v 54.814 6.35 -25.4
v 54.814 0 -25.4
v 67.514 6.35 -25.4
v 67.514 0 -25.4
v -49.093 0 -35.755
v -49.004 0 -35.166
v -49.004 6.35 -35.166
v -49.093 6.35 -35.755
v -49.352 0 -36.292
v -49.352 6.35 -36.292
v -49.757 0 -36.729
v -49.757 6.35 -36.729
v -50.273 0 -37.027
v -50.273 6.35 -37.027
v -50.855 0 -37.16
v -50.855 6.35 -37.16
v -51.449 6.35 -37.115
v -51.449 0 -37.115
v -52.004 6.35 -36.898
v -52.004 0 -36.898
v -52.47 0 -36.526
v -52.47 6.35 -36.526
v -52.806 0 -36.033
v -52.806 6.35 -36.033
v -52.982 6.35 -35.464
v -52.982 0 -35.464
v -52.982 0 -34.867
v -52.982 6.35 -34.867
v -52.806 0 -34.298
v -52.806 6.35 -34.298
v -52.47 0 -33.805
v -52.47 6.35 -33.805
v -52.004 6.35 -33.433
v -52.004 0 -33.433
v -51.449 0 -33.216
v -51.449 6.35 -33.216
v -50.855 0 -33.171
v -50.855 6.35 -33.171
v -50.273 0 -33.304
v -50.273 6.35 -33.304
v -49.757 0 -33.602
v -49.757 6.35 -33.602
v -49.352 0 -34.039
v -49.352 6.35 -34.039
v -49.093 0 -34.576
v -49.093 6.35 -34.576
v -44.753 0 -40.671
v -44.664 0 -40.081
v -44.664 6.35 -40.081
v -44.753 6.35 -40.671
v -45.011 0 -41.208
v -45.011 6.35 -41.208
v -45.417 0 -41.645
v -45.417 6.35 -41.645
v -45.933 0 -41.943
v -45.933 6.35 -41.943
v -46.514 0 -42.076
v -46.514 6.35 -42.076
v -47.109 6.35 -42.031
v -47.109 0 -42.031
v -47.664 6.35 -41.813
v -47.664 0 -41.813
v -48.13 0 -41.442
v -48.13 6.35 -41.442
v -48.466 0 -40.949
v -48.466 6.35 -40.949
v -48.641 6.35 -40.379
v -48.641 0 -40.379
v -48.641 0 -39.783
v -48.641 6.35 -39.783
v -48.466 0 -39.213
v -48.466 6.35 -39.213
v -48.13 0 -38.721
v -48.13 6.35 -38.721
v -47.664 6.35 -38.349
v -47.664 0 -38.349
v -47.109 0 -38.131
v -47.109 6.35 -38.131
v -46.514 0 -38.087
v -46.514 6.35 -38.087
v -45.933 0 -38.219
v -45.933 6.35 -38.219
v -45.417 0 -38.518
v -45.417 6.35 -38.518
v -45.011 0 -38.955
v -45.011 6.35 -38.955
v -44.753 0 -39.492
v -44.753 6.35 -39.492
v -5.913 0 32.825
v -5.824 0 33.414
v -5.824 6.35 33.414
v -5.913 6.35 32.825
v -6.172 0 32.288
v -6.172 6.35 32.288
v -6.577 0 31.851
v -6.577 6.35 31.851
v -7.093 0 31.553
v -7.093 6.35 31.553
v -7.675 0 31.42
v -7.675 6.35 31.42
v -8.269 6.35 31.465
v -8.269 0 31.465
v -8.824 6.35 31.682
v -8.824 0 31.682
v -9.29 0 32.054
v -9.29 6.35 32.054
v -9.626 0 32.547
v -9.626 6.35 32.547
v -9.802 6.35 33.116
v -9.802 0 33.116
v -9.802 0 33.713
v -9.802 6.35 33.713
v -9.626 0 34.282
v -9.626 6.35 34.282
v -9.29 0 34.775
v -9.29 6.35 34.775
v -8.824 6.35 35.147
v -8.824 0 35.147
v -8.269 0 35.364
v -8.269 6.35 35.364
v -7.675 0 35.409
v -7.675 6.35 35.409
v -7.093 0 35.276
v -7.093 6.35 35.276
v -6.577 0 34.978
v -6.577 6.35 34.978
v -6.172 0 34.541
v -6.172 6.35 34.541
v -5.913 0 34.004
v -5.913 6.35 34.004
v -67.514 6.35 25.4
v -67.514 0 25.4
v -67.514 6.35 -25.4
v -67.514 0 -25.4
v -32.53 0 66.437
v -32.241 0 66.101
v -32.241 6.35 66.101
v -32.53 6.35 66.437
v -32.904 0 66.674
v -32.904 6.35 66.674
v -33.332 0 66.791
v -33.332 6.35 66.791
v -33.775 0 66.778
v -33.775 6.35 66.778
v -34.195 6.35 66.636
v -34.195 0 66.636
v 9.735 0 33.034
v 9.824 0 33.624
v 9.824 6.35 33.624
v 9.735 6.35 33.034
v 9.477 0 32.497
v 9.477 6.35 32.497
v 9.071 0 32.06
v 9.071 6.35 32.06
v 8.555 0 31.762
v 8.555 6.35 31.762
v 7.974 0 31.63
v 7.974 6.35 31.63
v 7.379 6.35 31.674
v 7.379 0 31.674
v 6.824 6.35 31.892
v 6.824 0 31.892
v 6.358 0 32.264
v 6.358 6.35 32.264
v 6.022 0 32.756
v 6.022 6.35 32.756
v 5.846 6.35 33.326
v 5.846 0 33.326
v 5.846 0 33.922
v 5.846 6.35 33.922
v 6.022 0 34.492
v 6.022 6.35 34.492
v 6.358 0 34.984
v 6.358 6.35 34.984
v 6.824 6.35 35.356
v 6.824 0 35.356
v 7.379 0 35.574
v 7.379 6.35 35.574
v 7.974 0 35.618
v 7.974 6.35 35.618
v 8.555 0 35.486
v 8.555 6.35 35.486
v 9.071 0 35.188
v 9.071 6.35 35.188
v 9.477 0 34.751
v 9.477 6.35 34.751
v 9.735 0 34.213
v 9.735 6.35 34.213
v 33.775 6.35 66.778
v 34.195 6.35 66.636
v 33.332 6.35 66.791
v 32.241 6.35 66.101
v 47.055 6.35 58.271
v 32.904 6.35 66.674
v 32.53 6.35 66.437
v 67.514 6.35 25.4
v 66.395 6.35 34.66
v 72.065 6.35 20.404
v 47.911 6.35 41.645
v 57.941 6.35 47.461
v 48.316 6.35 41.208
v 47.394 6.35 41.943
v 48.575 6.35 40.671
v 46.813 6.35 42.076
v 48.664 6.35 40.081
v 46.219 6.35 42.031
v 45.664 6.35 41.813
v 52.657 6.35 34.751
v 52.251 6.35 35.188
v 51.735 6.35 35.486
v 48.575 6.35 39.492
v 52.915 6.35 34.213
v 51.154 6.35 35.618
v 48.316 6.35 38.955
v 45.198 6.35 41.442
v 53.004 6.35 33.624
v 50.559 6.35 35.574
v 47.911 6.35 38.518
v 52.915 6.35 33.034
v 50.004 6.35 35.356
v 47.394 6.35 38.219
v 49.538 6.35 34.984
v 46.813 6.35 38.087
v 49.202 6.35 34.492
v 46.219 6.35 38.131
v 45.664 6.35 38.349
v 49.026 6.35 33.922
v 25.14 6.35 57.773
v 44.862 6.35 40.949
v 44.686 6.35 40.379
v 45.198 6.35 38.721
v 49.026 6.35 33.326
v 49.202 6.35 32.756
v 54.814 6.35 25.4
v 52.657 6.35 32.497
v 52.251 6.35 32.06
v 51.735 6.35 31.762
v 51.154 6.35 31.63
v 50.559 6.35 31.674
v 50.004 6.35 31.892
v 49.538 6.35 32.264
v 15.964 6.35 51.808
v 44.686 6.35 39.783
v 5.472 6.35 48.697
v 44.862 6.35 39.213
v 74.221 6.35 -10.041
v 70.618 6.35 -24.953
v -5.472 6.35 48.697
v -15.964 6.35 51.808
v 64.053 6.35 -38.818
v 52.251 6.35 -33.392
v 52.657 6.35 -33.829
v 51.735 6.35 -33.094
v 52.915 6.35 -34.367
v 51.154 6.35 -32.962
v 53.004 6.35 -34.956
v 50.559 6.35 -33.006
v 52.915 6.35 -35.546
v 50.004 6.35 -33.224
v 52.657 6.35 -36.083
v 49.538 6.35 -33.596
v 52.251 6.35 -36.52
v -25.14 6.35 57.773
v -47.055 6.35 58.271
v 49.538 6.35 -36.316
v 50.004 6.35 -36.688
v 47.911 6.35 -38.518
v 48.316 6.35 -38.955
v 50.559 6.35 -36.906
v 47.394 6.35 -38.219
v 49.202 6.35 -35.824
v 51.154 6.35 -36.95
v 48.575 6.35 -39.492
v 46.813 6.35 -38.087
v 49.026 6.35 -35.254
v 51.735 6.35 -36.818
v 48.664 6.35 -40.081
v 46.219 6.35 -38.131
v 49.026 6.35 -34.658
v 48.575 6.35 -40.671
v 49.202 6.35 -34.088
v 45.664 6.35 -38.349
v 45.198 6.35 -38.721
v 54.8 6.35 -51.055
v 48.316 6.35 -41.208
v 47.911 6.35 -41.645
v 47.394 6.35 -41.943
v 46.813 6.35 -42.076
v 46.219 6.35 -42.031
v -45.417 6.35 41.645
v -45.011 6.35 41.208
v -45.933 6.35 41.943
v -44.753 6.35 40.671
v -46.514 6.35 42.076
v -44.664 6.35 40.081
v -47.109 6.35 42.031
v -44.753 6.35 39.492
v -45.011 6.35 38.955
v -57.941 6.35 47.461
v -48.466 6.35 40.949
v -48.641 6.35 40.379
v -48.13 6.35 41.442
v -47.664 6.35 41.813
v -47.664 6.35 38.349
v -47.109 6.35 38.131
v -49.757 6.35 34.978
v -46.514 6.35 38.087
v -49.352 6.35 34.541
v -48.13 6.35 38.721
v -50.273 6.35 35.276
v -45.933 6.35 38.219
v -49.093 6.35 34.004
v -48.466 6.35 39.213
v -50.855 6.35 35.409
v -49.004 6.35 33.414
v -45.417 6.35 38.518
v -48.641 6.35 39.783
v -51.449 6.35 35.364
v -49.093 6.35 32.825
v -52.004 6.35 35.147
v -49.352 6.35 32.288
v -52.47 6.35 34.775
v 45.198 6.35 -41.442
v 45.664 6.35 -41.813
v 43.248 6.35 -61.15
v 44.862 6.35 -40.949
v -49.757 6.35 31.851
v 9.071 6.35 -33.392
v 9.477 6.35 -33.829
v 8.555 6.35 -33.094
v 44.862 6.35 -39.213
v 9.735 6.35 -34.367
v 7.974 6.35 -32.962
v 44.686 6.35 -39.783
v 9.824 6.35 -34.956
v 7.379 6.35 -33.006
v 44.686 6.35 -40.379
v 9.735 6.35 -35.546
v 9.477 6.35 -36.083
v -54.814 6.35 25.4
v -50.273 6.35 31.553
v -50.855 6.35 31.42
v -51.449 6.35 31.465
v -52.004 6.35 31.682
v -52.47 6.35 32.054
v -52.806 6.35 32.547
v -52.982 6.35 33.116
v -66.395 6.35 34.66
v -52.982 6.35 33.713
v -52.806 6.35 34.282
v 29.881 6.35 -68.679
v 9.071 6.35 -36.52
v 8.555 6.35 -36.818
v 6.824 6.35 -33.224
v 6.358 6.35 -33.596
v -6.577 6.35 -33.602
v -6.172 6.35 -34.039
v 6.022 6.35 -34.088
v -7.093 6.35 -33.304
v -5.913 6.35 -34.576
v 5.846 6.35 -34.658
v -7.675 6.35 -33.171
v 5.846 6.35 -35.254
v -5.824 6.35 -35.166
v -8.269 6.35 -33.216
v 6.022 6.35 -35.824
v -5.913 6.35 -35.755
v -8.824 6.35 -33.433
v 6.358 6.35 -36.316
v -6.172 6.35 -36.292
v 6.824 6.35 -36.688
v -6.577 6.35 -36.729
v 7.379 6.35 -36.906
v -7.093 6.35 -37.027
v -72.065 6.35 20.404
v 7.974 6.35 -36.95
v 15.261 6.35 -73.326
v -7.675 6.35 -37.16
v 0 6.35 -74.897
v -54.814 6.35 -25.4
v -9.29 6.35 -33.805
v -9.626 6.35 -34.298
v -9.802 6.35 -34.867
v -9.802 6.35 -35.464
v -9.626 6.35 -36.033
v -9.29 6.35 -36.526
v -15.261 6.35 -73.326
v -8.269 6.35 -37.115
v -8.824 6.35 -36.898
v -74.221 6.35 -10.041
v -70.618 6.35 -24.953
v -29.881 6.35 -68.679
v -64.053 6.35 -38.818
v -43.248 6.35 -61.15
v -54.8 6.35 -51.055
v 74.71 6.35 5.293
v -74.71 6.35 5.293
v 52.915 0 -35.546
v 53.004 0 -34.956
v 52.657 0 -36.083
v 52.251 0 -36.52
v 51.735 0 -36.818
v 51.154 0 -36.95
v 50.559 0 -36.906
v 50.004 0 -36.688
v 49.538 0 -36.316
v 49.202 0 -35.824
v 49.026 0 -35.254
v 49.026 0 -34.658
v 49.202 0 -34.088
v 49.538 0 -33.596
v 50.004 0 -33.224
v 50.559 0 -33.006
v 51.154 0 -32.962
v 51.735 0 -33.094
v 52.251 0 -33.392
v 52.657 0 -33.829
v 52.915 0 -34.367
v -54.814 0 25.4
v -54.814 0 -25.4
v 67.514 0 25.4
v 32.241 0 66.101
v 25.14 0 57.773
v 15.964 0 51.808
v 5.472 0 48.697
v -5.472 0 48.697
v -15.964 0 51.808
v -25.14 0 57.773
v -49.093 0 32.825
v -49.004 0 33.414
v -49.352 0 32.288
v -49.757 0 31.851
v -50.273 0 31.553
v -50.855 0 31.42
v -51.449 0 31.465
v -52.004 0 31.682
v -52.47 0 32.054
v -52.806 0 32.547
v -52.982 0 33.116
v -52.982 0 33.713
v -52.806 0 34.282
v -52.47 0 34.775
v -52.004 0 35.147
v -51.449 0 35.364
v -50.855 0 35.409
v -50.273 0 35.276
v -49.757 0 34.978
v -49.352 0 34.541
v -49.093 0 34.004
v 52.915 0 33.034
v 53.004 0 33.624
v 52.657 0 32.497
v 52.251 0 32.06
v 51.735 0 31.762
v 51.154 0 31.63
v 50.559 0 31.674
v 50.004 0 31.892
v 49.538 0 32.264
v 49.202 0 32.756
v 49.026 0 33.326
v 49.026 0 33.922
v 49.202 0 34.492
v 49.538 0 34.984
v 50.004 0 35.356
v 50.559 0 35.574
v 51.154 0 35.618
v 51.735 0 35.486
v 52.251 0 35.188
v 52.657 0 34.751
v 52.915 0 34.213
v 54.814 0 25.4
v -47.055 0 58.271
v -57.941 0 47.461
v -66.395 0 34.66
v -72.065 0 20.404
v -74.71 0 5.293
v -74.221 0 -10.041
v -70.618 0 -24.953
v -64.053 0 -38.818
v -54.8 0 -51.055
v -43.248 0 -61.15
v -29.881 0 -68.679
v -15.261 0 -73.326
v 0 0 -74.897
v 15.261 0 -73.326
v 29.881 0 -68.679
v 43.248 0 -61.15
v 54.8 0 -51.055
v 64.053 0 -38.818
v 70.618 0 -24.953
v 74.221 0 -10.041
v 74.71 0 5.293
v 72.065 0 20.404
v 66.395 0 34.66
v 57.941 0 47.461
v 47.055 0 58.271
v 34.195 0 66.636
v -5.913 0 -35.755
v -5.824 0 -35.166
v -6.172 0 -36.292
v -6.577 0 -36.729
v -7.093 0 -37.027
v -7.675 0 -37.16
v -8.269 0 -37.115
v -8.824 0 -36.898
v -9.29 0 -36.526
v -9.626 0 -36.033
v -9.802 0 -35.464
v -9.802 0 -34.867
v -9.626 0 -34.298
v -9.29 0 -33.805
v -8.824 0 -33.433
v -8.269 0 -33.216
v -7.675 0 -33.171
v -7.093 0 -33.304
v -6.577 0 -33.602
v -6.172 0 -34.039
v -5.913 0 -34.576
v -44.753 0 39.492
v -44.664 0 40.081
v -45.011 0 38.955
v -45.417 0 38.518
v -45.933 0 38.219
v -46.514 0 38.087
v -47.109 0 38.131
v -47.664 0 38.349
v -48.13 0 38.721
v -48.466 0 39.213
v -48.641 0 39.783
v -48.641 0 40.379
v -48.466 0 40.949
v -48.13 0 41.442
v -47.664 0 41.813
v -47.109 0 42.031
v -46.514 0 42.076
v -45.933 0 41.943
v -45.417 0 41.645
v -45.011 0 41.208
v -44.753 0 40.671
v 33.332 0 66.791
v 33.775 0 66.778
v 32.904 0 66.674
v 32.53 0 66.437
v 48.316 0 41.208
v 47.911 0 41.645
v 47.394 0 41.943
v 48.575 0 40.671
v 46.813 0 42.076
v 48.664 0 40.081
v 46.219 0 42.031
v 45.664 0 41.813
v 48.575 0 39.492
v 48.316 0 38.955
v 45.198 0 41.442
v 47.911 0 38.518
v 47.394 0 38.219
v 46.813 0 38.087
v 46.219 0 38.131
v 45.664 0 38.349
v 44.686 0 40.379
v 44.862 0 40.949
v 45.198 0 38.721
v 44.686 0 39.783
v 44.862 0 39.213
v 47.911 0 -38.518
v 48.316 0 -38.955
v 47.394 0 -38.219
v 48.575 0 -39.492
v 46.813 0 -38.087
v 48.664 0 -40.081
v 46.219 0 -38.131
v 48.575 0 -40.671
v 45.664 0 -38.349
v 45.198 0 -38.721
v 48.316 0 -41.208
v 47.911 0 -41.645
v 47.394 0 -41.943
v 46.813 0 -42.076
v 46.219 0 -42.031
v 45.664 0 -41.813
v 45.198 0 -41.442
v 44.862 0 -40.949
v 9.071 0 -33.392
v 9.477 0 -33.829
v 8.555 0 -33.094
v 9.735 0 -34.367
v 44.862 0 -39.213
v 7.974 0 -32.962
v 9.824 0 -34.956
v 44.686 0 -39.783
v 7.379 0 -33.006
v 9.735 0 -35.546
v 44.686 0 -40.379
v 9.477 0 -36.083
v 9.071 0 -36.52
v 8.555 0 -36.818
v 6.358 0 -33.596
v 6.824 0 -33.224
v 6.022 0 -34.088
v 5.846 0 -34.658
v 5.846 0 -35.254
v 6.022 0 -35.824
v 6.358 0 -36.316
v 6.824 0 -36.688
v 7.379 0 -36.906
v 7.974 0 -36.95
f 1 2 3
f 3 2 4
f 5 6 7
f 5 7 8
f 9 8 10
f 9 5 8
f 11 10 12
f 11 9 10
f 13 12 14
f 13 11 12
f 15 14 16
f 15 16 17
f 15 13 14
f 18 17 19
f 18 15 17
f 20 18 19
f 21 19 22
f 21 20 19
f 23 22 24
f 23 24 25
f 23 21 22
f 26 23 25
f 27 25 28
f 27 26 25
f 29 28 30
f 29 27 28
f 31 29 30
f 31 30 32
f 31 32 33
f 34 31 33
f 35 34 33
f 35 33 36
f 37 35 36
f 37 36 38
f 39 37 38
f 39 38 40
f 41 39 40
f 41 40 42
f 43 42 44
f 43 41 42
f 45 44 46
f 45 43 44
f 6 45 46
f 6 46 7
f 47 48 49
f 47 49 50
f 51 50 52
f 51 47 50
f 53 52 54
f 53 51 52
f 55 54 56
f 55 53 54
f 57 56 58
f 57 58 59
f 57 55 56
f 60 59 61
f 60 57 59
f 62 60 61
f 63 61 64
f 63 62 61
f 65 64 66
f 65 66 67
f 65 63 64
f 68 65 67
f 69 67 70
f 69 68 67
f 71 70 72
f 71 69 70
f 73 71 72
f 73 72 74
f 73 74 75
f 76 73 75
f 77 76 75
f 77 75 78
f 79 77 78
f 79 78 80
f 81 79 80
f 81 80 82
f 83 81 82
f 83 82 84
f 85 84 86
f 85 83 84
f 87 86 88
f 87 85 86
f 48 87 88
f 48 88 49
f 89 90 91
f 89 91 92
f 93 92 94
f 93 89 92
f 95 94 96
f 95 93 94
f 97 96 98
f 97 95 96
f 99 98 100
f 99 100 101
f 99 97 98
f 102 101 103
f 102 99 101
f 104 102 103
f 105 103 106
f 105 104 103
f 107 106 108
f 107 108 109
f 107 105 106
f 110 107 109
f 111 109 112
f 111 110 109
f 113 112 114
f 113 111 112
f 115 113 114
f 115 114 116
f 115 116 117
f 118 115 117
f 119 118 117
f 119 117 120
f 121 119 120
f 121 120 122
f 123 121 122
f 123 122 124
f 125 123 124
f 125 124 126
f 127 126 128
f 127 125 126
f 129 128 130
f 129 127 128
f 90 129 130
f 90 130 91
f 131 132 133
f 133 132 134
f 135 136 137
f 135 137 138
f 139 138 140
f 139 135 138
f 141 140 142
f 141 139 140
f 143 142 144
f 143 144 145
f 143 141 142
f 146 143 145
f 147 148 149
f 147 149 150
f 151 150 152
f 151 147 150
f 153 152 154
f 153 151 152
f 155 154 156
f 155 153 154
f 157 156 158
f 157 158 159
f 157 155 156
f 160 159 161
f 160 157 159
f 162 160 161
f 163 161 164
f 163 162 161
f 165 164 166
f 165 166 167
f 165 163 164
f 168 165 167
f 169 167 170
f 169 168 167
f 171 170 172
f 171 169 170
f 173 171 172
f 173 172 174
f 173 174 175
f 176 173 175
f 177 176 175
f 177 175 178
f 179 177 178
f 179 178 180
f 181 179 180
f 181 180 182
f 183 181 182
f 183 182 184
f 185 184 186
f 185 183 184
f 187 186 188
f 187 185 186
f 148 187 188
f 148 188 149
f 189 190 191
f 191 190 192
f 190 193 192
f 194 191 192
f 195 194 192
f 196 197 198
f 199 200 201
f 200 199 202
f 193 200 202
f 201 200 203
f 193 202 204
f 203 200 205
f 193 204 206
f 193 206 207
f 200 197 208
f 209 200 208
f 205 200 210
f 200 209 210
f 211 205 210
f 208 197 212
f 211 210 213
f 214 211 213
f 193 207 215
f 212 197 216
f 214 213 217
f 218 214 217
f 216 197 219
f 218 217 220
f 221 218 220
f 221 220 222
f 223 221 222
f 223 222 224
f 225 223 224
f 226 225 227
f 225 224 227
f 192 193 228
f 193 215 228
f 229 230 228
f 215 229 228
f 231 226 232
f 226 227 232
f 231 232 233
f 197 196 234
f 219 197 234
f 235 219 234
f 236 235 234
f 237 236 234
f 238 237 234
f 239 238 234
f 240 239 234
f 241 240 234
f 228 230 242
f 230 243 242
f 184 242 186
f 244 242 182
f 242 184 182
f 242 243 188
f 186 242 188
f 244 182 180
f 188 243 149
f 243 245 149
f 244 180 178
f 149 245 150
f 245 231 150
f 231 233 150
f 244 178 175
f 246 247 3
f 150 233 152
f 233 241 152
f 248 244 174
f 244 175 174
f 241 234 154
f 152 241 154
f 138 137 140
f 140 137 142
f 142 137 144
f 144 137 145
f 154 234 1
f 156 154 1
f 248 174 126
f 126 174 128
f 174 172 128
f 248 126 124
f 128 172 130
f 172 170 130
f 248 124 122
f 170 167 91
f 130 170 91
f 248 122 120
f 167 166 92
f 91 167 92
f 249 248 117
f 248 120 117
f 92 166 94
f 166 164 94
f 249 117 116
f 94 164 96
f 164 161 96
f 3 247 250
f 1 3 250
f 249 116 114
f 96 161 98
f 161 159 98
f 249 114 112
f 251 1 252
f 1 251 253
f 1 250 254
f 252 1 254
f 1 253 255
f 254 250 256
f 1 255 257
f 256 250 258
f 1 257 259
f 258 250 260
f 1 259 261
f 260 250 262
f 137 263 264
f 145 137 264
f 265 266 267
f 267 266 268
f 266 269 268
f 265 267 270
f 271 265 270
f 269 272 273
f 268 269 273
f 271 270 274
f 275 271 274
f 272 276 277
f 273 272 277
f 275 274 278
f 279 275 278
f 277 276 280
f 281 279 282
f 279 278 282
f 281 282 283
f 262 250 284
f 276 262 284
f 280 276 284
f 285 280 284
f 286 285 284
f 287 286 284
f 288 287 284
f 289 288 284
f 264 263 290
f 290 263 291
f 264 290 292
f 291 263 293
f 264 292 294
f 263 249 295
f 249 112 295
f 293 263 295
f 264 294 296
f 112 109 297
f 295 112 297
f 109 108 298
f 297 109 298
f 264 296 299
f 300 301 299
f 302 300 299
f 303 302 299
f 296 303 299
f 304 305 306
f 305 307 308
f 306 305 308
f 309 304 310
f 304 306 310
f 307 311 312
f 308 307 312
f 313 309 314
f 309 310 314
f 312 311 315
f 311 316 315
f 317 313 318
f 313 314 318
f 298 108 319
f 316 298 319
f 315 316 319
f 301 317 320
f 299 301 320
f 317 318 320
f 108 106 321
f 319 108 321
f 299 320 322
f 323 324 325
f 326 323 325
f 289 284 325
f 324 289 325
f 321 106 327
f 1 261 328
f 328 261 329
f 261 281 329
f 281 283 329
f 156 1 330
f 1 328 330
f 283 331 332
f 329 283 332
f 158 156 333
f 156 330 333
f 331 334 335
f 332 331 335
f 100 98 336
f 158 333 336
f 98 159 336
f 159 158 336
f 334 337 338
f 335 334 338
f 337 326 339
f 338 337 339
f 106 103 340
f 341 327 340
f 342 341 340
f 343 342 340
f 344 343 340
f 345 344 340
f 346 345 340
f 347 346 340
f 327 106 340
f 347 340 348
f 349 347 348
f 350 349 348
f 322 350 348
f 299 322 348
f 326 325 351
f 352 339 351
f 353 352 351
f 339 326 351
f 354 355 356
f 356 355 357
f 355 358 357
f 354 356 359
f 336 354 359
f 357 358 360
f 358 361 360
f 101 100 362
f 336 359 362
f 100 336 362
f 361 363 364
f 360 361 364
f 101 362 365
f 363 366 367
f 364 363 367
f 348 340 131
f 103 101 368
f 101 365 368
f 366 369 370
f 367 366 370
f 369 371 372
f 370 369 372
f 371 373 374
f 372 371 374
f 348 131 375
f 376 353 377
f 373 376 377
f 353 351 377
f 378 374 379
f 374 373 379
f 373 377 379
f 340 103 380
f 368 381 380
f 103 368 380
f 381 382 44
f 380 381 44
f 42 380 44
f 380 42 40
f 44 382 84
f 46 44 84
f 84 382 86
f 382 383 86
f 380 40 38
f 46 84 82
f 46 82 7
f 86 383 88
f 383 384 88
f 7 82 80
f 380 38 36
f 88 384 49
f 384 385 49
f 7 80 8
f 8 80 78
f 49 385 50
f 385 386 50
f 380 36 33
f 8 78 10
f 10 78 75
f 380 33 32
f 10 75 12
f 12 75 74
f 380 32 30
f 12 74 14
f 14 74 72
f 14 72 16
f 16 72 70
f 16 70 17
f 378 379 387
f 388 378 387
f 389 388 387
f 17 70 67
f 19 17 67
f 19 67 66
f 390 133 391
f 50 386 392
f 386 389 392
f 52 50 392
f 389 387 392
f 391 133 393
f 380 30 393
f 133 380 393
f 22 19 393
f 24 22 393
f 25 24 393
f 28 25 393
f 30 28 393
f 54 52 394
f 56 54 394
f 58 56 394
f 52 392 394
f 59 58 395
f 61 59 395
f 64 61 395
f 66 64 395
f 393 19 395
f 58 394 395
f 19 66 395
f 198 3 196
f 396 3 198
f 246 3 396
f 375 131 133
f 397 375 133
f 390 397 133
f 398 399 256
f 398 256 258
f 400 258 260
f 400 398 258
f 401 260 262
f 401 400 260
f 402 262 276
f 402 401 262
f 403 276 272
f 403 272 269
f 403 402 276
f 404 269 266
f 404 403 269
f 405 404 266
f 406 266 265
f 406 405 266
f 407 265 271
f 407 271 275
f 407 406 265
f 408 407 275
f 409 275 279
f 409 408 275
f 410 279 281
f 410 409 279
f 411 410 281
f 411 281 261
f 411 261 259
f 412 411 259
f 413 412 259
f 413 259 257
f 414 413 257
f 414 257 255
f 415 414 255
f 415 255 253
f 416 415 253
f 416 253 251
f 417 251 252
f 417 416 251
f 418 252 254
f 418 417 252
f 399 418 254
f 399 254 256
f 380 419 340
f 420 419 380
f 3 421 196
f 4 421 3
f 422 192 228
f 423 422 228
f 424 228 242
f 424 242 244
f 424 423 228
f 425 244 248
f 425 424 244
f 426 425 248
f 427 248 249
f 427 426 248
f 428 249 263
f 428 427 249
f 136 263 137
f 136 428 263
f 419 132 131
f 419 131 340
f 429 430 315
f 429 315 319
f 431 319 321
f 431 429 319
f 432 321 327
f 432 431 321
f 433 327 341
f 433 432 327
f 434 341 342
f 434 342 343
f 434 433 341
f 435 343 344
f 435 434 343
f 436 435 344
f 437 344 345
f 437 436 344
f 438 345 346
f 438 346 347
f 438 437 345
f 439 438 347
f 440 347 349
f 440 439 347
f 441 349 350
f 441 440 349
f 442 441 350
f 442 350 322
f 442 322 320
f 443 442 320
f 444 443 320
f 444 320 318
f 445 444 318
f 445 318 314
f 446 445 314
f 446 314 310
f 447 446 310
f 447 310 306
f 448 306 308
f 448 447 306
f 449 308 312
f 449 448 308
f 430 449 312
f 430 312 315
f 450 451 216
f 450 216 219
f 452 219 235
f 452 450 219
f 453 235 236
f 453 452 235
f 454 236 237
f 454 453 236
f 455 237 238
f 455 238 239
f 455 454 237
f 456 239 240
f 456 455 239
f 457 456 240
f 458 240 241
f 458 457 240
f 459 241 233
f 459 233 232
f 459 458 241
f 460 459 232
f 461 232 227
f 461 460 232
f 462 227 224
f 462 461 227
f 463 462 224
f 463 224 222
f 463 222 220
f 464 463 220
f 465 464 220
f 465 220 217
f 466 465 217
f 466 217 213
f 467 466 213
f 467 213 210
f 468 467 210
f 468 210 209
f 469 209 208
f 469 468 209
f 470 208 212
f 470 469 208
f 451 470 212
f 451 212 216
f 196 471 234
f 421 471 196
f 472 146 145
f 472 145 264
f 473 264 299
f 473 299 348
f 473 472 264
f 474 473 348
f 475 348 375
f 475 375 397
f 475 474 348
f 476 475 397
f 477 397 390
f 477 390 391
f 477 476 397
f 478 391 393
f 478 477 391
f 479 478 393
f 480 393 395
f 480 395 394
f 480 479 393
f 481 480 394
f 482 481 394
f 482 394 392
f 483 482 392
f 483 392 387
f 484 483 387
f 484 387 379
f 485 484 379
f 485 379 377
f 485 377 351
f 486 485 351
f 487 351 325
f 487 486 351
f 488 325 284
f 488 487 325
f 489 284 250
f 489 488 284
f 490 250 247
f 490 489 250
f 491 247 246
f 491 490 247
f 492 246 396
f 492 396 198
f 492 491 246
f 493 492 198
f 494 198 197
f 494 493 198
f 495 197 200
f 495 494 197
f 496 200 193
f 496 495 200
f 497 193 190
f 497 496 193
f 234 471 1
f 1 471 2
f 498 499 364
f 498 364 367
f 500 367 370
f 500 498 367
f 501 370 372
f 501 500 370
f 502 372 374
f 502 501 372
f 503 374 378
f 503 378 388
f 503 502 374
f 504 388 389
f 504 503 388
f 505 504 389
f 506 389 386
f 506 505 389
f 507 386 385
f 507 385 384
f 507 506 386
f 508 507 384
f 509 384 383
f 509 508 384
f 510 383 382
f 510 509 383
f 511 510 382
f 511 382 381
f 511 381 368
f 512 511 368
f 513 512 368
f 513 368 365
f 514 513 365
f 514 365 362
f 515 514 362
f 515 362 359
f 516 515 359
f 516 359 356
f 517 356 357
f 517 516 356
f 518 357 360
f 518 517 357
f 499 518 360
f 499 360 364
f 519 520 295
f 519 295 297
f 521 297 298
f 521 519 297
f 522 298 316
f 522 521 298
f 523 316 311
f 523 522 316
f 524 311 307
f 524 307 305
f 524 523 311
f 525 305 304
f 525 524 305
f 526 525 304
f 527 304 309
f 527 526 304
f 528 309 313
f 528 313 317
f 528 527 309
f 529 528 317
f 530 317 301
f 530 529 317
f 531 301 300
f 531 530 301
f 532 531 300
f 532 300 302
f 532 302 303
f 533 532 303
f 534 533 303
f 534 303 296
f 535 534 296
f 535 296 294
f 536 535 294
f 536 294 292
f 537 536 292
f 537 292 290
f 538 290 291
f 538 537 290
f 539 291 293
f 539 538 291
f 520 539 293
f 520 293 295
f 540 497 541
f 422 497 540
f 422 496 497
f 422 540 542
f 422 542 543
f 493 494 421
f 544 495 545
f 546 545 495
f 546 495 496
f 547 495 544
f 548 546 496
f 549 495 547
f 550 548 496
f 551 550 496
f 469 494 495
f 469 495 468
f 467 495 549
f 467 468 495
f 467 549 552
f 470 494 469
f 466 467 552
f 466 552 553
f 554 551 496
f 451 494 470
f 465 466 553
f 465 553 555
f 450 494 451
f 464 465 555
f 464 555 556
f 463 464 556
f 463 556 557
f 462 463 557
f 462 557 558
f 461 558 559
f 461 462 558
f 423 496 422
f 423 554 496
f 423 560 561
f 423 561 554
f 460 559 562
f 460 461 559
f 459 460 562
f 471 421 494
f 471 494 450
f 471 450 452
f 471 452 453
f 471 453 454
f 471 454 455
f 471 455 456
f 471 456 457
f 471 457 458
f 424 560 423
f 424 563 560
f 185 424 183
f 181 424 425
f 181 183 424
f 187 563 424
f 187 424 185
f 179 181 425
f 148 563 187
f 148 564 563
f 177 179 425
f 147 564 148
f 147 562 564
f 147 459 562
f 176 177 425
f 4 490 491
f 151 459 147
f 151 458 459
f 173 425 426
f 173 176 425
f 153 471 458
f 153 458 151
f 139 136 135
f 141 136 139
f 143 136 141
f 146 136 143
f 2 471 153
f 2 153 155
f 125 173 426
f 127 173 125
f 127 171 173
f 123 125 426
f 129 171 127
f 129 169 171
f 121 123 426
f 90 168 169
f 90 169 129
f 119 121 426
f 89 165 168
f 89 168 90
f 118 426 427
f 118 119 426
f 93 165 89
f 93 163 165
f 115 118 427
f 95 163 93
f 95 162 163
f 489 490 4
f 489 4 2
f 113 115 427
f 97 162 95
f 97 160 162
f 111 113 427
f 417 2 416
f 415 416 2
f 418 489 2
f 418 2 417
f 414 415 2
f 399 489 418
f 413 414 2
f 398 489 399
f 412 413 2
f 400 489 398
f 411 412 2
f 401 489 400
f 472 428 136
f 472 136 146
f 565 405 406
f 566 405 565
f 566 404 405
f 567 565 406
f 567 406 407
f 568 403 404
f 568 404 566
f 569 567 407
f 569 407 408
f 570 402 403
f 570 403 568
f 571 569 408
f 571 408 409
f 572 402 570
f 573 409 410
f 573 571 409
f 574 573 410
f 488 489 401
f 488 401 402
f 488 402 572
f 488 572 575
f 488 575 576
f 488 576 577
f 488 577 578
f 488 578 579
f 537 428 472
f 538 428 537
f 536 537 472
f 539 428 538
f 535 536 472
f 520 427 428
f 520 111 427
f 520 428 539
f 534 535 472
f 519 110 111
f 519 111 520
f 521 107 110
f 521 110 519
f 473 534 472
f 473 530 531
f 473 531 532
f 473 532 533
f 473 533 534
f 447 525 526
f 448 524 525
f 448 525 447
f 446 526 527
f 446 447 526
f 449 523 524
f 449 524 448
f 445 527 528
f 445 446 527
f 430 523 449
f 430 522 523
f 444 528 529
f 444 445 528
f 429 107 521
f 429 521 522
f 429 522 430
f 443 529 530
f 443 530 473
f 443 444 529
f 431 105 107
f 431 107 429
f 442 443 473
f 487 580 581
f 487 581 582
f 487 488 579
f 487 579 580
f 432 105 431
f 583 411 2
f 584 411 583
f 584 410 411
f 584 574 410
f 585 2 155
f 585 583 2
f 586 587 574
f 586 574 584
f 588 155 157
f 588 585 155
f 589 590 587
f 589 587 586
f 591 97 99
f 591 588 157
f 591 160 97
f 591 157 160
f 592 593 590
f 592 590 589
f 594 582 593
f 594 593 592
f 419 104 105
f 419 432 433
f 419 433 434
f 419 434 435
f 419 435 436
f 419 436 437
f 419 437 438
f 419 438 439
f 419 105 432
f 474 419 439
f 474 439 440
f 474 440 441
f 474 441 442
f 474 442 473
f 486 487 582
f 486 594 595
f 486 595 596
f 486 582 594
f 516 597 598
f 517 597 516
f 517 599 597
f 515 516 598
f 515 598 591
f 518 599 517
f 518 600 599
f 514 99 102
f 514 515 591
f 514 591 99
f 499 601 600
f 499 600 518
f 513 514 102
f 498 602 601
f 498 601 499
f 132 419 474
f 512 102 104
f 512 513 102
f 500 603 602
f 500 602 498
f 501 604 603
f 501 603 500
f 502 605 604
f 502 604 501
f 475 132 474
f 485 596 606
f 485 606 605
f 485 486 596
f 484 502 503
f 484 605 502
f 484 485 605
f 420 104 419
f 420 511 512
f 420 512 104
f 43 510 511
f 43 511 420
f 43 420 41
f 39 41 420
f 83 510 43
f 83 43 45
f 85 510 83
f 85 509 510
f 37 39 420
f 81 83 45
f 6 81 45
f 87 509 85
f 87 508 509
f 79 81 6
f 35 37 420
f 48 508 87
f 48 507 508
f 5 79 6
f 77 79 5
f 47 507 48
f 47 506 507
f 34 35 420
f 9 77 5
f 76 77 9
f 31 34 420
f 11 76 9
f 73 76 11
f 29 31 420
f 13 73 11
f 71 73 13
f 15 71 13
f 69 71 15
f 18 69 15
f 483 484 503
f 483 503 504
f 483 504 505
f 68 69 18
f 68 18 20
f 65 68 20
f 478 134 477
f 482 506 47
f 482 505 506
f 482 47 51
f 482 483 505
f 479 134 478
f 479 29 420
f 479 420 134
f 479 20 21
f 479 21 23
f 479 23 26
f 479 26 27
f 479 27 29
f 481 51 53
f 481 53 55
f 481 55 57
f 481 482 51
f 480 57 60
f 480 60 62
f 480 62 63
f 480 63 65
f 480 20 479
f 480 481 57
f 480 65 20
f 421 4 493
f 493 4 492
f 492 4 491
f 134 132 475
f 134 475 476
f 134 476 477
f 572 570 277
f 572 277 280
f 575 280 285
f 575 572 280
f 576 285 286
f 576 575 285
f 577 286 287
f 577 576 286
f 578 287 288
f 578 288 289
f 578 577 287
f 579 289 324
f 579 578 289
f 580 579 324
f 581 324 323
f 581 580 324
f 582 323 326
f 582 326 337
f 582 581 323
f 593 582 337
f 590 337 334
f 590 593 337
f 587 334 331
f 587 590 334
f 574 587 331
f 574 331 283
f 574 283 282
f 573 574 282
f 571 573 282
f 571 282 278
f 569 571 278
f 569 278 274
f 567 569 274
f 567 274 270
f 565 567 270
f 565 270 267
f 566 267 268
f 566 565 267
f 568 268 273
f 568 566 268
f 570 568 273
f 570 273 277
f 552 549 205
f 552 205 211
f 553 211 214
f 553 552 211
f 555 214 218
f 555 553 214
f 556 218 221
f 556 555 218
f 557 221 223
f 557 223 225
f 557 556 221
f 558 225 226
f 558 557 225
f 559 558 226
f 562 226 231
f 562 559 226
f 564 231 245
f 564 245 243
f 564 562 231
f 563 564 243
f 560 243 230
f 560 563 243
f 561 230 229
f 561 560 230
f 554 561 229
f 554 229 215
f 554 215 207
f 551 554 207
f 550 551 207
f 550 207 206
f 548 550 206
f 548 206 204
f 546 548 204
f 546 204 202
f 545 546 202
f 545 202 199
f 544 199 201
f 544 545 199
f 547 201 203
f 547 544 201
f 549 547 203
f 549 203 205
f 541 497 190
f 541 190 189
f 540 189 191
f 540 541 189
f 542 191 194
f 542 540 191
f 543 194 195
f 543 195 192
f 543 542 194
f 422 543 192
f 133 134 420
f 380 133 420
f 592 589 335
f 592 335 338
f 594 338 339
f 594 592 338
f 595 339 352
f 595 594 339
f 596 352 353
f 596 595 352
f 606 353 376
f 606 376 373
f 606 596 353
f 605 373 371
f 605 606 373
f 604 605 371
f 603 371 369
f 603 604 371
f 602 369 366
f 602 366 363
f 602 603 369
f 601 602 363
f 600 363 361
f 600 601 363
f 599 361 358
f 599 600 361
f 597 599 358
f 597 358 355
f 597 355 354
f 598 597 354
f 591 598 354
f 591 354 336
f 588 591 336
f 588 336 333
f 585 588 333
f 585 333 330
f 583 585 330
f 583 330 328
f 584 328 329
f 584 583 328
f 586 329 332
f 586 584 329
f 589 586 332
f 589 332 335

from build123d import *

# Parameters (mm, degrees)
SKETCH1_R           = 2
SKETCH1_W           = 12.7
SKETCH1_H           = 50.8
BOSS_EXTRUDE3_DEPTH = 6.35


with BuildPart() as part:
    # Sketch1 → Boss-Extrude3 (new body)
    with BuildSketch(Plane(origin=(0, 0, 0), x_dir=(1, 0, 0), z_dir=(0, 1, 0))):
        with BuildLine():
            ThreePointArc((32.240681933, -66.10056535), (0, -48.302004425), (-32.240681933, -66.10056535))
            ThreePointArc((-32.240681933, -66.10056535), (-33.11372382, -66.748004461), (-34.194833578, -66.63583839))
            ThreePointArc((-34.194833578, -66.63583839), (0, 74.897407173), (34.194833578, -66.63583839))
            ThreePointArc((34.194833578, -66.63583839), (33.11372382, -66.748004461), (32.240681933, -66.10056535))
        make_face()
        with Locations((-51.004123727, -33.414457974)):
            Circle(SKETCH1_R, mode=Mode.SUBTRACT)
        with Locations((7.824123727, -33.623956053)):
            Circle(SKETCH1_R, mode=Mode.SUBTRACT)
        with Locations((51.004123727, -33.623956053)):
            Circle(SKETCH1_R, mode=Mode.SUBTRACT)
        with Locations((51.004123727, 34.956043947)):
            Circle(SKETCH1_R, mode=Mode.SUBTRACT)
        with Locations((-7.824123727, 35.165542026)):
            Circle(SKETCH1_R, mode=Mode.SUBTRACT)
        with Locations((-7.824123727, -33.414457974)):
            Circle(SKETCH1_R, mode=Mode.SUBTRACT)
        with Locations((-51.004123727, 35.165542026)):
            Circle(SKETCH1_R, mode=Mode.SUBTRACT)
        with Locations((-46.663733983, -40.081231883)):
            Circle(SKETCH1_R, mode=Mode.SUBTRACT)
        with Locations((46.663733983, -40.081231883)):
            Circle(SKETCH1_R, mode=Mode.SUBTRACT)
        with Locations((46.663733983, 40.081231883)):
            Circle(SKETCH1_R, mode=Mode.SUBTRACT)
        with Locations((-46.663733983, 40.081231883)):
            Circle(SKETCH1_R, mode=Mode.SUBTRACT)
        with Locations((7.824123727, 34.956043947)):
            Circle(SKETCH1_R, mode=Mode.SUBTRACT)
        with Locations((61.164123727, 0)):
            Rectangle(SKETCH1_W, SKETCH1_H, mode=Mode.SUBTRACT)
        with Locations((-61.164123727, 0)):
            Rectangle(SKETCH1_W, SKETCH1_H, mode=Mode.SUBTRACT)
    extrude(amount=BOSS_EXTRUDE3_DEPTH)


solid = part.part
